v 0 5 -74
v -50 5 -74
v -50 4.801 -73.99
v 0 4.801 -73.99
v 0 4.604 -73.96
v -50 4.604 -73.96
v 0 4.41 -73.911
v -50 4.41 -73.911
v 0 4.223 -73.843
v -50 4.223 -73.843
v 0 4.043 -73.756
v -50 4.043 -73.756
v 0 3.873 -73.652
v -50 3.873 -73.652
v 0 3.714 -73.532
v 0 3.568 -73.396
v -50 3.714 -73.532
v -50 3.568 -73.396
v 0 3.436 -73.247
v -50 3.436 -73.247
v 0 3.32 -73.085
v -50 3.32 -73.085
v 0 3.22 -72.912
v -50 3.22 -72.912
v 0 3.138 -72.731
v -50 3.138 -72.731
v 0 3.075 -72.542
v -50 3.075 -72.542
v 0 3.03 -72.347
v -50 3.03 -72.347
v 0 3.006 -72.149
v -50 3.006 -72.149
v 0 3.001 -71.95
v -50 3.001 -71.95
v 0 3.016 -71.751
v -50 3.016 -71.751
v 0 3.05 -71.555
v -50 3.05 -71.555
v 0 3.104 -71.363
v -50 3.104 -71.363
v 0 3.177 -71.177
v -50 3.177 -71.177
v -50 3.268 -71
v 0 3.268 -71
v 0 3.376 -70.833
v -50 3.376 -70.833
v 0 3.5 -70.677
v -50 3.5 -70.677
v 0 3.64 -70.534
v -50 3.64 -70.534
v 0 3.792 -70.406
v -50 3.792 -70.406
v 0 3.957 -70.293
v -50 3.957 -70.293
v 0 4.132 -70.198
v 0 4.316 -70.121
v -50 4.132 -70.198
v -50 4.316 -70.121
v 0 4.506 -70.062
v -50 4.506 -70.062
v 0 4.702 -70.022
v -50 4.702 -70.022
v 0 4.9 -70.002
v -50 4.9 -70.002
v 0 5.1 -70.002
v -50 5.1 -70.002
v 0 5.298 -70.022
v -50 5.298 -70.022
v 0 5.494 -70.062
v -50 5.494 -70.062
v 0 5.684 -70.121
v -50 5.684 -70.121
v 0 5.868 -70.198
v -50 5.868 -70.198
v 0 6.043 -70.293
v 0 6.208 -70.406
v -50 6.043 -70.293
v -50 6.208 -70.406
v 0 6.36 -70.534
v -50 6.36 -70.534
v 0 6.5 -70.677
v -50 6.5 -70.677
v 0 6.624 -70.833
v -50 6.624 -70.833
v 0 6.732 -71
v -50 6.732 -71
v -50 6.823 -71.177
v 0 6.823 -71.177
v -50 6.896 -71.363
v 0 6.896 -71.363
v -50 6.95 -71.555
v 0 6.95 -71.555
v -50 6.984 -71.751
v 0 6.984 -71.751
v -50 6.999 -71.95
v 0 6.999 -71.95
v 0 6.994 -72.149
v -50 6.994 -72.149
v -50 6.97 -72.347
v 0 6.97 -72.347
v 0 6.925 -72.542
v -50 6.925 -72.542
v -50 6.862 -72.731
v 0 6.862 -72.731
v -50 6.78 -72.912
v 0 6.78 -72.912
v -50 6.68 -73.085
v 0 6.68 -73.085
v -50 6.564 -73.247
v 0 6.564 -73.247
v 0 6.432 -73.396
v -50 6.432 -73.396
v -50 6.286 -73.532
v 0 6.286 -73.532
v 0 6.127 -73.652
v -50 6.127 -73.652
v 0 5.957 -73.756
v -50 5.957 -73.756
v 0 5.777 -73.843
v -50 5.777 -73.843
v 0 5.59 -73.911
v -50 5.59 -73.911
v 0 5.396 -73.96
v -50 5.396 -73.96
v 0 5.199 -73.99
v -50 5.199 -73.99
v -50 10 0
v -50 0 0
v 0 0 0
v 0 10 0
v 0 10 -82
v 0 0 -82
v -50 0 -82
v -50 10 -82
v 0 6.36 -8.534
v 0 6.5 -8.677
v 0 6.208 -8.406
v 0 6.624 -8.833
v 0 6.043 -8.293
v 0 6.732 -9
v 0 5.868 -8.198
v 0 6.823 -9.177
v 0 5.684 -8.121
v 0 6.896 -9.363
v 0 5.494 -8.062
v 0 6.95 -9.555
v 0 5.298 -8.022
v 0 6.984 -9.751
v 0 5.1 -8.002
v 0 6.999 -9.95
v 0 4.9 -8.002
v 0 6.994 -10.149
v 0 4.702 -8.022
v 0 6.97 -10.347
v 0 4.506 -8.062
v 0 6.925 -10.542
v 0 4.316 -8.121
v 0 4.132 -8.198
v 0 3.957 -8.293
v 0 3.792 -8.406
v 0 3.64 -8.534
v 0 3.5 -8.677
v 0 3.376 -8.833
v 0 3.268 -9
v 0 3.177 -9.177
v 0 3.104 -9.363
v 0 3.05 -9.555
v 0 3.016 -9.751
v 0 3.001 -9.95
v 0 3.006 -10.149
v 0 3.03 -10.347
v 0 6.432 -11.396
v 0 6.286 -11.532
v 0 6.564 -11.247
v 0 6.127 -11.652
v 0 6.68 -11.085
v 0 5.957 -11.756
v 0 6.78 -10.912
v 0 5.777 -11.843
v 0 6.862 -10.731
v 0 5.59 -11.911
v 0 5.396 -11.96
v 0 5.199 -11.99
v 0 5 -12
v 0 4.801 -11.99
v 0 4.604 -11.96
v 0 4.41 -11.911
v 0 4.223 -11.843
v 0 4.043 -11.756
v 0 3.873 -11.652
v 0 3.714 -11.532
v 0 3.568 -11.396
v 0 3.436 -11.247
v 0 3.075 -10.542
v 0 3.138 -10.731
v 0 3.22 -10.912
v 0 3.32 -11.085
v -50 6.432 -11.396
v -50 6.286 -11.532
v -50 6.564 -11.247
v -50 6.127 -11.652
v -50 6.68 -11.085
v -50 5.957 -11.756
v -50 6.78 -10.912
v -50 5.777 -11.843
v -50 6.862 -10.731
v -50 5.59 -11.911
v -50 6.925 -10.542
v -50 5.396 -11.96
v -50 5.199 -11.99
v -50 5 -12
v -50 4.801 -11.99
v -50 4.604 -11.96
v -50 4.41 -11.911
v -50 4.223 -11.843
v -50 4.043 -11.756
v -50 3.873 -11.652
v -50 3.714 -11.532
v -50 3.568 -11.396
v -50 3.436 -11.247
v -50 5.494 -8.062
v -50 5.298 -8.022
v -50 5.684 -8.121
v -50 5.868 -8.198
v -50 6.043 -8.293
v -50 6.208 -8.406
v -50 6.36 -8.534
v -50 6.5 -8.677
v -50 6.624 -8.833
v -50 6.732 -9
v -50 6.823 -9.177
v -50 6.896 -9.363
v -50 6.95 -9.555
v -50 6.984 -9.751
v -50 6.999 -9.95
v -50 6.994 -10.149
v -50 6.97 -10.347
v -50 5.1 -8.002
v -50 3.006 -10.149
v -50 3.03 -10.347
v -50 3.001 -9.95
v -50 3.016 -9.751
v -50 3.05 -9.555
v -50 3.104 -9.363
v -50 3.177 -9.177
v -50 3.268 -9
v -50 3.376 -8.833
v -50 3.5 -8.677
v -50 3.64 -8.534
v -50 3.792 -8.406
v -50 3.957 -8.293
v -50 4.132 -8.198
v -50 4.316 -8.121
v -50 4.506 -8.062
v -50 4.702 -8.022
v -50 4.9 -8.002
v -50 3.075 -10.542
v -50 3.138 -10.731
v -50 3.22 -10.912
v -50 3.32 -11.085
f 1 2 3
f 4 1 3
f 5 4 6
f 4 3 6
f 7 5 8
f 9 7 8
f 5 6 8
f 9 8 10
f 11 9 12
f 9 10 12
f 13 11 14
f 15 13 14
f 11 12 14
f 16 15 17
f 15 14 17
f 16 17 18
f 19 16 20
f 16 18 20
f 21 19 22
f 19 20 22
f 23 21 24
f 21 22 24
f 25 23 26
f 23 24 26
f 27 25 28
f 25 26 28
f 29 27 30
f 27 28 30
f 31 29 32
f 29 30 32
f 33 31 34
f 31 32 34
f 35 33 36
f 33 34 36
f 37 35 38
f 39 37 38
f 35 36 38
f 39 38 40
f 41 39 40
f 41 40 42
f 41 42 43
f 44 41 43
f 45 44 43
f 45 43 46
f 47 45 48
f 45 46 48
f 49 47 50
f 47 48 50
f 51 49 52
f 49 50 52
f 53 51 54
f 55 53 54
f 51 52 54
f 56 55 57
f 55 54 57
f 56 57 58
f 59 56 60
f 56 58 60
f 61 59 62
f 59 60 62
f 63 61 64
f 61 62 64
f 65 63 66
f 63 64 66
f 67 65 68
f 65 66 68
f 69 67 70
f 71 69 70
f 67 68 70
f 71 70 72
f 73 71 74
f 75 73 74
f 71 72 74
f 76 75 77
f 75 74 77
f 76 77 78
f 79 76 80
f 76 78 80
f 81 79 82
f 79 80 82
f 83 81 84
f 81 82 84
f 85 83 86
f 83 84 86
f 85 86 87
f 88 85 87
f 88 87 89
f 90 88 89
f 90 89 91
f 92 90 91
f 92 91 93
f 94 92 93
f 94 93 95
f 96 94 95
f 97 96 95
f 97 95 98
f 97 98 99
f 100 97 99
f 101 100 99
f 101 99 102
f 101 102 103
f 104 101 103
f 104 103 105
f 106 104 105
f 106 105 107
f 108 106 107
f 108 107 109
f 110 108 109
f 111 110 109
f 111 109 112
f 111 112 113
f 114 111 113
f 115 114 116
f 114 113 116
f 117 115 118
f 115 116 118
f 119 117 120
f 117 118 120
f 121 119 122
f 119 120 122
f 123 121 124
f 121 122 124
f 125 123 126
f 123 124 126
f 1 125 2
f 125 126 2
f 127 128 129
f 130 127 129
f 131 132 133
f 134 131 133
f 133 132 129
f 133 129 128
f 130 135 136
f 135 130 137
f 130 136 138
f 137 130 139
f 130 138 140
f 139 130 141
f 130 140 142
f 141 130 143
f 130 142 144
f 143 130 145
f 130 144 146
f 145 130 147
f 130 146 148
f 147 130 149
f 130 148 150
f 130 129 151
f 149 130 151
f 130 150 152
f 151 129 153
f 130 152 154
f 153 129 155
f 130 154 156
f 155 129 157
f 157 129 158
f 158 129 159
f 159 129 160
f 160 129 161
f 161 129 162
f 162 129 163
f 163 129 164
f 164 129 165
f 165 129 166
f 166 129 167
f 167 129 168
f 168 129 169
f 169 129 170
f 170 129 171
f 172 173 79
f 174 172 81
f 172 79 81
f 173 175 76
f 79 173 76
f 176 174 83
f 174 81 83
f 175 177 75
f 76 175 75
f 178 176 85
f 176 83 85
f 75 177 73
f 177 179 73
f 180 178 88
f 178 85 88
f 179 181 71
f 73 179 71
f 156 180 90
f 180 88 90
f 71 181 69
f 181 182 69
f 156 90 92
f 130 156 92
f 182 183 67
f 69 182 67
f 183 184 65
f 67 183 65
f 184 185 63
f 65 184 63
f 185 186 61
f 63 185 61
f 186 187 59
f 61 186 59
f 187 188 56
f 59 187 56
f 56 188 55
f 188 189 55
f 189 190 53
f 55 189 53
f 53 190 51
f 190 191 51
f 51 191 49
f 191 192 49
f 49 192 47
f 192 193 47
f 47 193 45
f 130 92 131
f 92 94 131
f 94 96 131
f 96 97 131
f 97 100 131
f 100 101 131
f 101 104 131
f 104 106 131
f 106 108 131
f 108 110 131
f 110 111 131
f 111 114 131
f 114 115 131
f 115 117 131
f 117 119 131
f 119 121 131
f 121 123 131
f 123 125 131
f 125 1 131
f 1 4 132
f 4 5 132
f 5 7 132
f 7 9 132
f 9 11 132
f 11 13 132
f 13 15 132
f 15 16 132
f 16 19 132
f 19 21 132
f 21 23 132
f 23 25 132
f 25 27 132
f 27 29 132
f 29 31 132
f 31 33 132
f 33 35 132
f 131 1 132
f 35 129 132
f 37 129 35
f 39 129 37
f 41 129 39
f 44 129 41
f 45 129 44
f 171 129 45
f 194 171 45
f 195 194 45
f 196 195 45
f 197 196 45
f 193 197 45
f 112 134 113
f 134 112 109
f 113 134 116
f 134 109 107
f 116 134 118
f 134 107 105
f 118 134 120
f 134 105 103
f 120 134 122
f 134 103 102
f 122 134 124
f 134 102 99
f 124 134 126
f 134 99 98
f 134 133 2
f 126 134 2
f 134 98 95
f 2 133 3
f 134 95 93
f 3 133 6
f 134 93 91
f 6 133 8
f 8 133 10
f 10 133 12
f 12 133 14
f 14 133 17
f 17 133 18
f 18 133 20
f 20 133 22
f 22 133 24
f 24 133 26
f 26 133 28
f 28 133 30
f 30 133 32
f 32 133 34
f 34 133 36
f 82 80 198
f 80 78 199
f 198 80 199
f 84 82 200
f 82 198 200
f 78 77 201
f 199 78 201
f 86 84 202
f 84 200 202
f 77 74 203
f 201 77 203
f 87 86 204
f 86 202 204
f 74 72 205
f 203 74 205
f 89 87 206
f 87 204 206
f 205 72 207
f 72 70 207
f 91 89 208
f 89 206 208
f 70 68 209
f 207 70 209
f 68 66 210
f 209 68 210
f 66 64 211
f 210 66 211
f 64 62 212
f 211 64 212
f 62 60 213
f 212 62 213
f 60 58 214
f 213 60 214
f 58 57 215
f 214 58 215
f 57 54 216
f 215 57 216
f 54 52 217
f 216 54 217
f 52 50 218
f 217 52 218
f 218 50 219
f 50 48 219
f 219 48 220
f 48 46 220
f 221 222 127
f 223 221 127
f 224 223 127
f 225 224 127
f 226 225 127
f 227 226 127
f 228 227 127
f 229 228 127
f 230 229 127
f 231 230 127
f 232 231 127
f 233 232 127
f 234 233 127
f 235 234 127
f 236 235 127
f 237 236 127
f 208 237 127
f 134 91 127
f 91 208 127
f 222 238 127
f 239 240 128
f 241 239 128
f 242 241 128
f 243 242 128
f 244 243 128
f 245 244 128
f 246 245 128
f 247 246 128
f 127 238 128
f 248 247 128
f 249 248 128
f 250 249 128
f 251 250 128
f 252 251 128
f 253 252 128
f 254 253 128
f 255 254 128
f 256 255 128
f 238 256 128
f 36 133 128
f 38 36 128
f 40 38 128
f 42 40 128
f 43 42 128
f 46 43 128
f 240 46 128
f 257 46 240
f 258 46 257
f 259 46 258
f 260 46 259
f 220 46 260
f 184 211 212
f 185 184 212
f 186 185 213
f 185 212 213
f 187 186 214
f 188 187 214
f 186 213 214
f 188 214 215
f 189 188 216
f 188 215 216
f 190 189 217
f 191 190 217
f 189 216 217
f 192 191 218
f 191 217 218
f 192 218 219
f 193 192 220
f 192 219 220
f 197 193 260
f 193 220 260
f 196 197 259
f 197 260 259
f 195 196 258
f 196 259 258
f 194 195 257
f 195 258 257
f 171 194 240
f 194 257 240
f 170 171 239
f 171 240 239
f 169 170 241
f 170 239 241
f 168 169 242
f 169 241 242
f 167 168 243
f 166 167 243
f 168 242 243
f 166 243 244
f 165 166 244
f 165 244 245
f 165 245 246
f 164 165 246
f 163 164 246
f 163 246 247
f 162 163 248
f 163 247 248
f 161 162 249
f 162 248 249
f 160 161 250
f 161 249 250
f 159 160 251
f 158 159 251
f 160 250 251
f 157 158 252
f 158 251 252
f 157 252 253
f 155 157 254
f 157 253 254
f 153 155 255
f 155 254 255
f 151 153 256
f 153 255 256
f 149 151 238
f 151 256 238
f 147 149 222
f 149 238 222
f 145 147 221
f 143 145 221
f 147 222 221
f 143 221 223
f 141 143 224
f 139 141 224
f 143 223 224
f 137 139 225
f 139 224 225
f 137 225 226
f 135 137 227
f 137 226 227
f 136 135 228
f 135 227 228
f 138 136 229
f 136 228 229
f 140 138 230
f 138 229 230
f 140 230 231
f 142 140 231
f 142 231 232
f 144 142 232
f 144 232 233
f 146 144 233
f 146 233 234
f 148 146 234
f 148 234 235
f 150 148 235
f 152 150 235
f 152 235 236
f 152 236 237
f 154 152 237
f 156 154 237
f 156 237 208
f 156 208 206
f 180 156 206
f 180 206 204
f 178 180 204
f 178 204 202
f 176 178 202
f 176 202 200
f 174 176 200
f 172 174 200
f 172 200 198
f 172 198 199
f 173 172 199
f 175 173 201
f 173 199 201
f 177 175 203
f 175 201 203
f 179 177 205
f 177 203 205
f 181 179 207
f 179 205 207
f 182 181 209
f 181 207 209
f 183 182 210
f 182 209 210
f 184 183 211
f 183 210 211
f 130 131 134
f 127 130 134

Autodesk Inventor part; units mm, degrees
ref_plane "YZ Plane" through (0, 0, 0) normal (1, 0, 0) x (0, 1, 0)
ref_plane "XZ Plane" through (0, 0, 0) normal (0, 1, 0) x (-1, 0, 0)
ref_plane "XY Plane" through (0, 0, 0) normal (0, 0, 1) x (1, 0, 0)
sketch "Esquisse1" plane through (0, 0, 0) normal (0, 1, 0) x (-1, 0, 0)
  line L0 (50, 0) -> (0, 0)
  line L1 (0, 0) -> (0, -82)
  line L2 (0, -82) -> (50, -82)
  line L3 (50, -82) -> (50, 0)
  point P0 (0, 0)
  dimension "d0" = 0
  dimension "d1" = 0
  dimension "d2" = 50
  dimension "d3" = 82
extrude "Extrusion1" add sketch "Esquisse1" along normal blind 10
sketch "Esquisse2" plane through (-50, 0, 0) normal (0, 0, 1) x (1, 0, 0)
  point P0 (50, 0)
sketch "Esquisse3" plane through (0, 0, 0) normal (1, 0, 0) x (0, 0, -1)
  line L0 (10, 5) -> (72, 5)
  line L1 (0, 0) -> (0, 10) projected
  circle A0 centre (10, 5) radius 2
  circle A1 centre (72, 5) radius 2
  line L2 (0, 10) -> (82, 10) projected
  dimension "d7" = 62
  dimension "d8" = 10
  dimension "d9" = 4
  dimension "d10" = 4
  dimension "d11" = 5
hole "Perçage1" at (0, 5, -10) at (0, 5, -72) direction (-1, 0, 0) diameter 4 end through all
properties part number "spacermoteur"
